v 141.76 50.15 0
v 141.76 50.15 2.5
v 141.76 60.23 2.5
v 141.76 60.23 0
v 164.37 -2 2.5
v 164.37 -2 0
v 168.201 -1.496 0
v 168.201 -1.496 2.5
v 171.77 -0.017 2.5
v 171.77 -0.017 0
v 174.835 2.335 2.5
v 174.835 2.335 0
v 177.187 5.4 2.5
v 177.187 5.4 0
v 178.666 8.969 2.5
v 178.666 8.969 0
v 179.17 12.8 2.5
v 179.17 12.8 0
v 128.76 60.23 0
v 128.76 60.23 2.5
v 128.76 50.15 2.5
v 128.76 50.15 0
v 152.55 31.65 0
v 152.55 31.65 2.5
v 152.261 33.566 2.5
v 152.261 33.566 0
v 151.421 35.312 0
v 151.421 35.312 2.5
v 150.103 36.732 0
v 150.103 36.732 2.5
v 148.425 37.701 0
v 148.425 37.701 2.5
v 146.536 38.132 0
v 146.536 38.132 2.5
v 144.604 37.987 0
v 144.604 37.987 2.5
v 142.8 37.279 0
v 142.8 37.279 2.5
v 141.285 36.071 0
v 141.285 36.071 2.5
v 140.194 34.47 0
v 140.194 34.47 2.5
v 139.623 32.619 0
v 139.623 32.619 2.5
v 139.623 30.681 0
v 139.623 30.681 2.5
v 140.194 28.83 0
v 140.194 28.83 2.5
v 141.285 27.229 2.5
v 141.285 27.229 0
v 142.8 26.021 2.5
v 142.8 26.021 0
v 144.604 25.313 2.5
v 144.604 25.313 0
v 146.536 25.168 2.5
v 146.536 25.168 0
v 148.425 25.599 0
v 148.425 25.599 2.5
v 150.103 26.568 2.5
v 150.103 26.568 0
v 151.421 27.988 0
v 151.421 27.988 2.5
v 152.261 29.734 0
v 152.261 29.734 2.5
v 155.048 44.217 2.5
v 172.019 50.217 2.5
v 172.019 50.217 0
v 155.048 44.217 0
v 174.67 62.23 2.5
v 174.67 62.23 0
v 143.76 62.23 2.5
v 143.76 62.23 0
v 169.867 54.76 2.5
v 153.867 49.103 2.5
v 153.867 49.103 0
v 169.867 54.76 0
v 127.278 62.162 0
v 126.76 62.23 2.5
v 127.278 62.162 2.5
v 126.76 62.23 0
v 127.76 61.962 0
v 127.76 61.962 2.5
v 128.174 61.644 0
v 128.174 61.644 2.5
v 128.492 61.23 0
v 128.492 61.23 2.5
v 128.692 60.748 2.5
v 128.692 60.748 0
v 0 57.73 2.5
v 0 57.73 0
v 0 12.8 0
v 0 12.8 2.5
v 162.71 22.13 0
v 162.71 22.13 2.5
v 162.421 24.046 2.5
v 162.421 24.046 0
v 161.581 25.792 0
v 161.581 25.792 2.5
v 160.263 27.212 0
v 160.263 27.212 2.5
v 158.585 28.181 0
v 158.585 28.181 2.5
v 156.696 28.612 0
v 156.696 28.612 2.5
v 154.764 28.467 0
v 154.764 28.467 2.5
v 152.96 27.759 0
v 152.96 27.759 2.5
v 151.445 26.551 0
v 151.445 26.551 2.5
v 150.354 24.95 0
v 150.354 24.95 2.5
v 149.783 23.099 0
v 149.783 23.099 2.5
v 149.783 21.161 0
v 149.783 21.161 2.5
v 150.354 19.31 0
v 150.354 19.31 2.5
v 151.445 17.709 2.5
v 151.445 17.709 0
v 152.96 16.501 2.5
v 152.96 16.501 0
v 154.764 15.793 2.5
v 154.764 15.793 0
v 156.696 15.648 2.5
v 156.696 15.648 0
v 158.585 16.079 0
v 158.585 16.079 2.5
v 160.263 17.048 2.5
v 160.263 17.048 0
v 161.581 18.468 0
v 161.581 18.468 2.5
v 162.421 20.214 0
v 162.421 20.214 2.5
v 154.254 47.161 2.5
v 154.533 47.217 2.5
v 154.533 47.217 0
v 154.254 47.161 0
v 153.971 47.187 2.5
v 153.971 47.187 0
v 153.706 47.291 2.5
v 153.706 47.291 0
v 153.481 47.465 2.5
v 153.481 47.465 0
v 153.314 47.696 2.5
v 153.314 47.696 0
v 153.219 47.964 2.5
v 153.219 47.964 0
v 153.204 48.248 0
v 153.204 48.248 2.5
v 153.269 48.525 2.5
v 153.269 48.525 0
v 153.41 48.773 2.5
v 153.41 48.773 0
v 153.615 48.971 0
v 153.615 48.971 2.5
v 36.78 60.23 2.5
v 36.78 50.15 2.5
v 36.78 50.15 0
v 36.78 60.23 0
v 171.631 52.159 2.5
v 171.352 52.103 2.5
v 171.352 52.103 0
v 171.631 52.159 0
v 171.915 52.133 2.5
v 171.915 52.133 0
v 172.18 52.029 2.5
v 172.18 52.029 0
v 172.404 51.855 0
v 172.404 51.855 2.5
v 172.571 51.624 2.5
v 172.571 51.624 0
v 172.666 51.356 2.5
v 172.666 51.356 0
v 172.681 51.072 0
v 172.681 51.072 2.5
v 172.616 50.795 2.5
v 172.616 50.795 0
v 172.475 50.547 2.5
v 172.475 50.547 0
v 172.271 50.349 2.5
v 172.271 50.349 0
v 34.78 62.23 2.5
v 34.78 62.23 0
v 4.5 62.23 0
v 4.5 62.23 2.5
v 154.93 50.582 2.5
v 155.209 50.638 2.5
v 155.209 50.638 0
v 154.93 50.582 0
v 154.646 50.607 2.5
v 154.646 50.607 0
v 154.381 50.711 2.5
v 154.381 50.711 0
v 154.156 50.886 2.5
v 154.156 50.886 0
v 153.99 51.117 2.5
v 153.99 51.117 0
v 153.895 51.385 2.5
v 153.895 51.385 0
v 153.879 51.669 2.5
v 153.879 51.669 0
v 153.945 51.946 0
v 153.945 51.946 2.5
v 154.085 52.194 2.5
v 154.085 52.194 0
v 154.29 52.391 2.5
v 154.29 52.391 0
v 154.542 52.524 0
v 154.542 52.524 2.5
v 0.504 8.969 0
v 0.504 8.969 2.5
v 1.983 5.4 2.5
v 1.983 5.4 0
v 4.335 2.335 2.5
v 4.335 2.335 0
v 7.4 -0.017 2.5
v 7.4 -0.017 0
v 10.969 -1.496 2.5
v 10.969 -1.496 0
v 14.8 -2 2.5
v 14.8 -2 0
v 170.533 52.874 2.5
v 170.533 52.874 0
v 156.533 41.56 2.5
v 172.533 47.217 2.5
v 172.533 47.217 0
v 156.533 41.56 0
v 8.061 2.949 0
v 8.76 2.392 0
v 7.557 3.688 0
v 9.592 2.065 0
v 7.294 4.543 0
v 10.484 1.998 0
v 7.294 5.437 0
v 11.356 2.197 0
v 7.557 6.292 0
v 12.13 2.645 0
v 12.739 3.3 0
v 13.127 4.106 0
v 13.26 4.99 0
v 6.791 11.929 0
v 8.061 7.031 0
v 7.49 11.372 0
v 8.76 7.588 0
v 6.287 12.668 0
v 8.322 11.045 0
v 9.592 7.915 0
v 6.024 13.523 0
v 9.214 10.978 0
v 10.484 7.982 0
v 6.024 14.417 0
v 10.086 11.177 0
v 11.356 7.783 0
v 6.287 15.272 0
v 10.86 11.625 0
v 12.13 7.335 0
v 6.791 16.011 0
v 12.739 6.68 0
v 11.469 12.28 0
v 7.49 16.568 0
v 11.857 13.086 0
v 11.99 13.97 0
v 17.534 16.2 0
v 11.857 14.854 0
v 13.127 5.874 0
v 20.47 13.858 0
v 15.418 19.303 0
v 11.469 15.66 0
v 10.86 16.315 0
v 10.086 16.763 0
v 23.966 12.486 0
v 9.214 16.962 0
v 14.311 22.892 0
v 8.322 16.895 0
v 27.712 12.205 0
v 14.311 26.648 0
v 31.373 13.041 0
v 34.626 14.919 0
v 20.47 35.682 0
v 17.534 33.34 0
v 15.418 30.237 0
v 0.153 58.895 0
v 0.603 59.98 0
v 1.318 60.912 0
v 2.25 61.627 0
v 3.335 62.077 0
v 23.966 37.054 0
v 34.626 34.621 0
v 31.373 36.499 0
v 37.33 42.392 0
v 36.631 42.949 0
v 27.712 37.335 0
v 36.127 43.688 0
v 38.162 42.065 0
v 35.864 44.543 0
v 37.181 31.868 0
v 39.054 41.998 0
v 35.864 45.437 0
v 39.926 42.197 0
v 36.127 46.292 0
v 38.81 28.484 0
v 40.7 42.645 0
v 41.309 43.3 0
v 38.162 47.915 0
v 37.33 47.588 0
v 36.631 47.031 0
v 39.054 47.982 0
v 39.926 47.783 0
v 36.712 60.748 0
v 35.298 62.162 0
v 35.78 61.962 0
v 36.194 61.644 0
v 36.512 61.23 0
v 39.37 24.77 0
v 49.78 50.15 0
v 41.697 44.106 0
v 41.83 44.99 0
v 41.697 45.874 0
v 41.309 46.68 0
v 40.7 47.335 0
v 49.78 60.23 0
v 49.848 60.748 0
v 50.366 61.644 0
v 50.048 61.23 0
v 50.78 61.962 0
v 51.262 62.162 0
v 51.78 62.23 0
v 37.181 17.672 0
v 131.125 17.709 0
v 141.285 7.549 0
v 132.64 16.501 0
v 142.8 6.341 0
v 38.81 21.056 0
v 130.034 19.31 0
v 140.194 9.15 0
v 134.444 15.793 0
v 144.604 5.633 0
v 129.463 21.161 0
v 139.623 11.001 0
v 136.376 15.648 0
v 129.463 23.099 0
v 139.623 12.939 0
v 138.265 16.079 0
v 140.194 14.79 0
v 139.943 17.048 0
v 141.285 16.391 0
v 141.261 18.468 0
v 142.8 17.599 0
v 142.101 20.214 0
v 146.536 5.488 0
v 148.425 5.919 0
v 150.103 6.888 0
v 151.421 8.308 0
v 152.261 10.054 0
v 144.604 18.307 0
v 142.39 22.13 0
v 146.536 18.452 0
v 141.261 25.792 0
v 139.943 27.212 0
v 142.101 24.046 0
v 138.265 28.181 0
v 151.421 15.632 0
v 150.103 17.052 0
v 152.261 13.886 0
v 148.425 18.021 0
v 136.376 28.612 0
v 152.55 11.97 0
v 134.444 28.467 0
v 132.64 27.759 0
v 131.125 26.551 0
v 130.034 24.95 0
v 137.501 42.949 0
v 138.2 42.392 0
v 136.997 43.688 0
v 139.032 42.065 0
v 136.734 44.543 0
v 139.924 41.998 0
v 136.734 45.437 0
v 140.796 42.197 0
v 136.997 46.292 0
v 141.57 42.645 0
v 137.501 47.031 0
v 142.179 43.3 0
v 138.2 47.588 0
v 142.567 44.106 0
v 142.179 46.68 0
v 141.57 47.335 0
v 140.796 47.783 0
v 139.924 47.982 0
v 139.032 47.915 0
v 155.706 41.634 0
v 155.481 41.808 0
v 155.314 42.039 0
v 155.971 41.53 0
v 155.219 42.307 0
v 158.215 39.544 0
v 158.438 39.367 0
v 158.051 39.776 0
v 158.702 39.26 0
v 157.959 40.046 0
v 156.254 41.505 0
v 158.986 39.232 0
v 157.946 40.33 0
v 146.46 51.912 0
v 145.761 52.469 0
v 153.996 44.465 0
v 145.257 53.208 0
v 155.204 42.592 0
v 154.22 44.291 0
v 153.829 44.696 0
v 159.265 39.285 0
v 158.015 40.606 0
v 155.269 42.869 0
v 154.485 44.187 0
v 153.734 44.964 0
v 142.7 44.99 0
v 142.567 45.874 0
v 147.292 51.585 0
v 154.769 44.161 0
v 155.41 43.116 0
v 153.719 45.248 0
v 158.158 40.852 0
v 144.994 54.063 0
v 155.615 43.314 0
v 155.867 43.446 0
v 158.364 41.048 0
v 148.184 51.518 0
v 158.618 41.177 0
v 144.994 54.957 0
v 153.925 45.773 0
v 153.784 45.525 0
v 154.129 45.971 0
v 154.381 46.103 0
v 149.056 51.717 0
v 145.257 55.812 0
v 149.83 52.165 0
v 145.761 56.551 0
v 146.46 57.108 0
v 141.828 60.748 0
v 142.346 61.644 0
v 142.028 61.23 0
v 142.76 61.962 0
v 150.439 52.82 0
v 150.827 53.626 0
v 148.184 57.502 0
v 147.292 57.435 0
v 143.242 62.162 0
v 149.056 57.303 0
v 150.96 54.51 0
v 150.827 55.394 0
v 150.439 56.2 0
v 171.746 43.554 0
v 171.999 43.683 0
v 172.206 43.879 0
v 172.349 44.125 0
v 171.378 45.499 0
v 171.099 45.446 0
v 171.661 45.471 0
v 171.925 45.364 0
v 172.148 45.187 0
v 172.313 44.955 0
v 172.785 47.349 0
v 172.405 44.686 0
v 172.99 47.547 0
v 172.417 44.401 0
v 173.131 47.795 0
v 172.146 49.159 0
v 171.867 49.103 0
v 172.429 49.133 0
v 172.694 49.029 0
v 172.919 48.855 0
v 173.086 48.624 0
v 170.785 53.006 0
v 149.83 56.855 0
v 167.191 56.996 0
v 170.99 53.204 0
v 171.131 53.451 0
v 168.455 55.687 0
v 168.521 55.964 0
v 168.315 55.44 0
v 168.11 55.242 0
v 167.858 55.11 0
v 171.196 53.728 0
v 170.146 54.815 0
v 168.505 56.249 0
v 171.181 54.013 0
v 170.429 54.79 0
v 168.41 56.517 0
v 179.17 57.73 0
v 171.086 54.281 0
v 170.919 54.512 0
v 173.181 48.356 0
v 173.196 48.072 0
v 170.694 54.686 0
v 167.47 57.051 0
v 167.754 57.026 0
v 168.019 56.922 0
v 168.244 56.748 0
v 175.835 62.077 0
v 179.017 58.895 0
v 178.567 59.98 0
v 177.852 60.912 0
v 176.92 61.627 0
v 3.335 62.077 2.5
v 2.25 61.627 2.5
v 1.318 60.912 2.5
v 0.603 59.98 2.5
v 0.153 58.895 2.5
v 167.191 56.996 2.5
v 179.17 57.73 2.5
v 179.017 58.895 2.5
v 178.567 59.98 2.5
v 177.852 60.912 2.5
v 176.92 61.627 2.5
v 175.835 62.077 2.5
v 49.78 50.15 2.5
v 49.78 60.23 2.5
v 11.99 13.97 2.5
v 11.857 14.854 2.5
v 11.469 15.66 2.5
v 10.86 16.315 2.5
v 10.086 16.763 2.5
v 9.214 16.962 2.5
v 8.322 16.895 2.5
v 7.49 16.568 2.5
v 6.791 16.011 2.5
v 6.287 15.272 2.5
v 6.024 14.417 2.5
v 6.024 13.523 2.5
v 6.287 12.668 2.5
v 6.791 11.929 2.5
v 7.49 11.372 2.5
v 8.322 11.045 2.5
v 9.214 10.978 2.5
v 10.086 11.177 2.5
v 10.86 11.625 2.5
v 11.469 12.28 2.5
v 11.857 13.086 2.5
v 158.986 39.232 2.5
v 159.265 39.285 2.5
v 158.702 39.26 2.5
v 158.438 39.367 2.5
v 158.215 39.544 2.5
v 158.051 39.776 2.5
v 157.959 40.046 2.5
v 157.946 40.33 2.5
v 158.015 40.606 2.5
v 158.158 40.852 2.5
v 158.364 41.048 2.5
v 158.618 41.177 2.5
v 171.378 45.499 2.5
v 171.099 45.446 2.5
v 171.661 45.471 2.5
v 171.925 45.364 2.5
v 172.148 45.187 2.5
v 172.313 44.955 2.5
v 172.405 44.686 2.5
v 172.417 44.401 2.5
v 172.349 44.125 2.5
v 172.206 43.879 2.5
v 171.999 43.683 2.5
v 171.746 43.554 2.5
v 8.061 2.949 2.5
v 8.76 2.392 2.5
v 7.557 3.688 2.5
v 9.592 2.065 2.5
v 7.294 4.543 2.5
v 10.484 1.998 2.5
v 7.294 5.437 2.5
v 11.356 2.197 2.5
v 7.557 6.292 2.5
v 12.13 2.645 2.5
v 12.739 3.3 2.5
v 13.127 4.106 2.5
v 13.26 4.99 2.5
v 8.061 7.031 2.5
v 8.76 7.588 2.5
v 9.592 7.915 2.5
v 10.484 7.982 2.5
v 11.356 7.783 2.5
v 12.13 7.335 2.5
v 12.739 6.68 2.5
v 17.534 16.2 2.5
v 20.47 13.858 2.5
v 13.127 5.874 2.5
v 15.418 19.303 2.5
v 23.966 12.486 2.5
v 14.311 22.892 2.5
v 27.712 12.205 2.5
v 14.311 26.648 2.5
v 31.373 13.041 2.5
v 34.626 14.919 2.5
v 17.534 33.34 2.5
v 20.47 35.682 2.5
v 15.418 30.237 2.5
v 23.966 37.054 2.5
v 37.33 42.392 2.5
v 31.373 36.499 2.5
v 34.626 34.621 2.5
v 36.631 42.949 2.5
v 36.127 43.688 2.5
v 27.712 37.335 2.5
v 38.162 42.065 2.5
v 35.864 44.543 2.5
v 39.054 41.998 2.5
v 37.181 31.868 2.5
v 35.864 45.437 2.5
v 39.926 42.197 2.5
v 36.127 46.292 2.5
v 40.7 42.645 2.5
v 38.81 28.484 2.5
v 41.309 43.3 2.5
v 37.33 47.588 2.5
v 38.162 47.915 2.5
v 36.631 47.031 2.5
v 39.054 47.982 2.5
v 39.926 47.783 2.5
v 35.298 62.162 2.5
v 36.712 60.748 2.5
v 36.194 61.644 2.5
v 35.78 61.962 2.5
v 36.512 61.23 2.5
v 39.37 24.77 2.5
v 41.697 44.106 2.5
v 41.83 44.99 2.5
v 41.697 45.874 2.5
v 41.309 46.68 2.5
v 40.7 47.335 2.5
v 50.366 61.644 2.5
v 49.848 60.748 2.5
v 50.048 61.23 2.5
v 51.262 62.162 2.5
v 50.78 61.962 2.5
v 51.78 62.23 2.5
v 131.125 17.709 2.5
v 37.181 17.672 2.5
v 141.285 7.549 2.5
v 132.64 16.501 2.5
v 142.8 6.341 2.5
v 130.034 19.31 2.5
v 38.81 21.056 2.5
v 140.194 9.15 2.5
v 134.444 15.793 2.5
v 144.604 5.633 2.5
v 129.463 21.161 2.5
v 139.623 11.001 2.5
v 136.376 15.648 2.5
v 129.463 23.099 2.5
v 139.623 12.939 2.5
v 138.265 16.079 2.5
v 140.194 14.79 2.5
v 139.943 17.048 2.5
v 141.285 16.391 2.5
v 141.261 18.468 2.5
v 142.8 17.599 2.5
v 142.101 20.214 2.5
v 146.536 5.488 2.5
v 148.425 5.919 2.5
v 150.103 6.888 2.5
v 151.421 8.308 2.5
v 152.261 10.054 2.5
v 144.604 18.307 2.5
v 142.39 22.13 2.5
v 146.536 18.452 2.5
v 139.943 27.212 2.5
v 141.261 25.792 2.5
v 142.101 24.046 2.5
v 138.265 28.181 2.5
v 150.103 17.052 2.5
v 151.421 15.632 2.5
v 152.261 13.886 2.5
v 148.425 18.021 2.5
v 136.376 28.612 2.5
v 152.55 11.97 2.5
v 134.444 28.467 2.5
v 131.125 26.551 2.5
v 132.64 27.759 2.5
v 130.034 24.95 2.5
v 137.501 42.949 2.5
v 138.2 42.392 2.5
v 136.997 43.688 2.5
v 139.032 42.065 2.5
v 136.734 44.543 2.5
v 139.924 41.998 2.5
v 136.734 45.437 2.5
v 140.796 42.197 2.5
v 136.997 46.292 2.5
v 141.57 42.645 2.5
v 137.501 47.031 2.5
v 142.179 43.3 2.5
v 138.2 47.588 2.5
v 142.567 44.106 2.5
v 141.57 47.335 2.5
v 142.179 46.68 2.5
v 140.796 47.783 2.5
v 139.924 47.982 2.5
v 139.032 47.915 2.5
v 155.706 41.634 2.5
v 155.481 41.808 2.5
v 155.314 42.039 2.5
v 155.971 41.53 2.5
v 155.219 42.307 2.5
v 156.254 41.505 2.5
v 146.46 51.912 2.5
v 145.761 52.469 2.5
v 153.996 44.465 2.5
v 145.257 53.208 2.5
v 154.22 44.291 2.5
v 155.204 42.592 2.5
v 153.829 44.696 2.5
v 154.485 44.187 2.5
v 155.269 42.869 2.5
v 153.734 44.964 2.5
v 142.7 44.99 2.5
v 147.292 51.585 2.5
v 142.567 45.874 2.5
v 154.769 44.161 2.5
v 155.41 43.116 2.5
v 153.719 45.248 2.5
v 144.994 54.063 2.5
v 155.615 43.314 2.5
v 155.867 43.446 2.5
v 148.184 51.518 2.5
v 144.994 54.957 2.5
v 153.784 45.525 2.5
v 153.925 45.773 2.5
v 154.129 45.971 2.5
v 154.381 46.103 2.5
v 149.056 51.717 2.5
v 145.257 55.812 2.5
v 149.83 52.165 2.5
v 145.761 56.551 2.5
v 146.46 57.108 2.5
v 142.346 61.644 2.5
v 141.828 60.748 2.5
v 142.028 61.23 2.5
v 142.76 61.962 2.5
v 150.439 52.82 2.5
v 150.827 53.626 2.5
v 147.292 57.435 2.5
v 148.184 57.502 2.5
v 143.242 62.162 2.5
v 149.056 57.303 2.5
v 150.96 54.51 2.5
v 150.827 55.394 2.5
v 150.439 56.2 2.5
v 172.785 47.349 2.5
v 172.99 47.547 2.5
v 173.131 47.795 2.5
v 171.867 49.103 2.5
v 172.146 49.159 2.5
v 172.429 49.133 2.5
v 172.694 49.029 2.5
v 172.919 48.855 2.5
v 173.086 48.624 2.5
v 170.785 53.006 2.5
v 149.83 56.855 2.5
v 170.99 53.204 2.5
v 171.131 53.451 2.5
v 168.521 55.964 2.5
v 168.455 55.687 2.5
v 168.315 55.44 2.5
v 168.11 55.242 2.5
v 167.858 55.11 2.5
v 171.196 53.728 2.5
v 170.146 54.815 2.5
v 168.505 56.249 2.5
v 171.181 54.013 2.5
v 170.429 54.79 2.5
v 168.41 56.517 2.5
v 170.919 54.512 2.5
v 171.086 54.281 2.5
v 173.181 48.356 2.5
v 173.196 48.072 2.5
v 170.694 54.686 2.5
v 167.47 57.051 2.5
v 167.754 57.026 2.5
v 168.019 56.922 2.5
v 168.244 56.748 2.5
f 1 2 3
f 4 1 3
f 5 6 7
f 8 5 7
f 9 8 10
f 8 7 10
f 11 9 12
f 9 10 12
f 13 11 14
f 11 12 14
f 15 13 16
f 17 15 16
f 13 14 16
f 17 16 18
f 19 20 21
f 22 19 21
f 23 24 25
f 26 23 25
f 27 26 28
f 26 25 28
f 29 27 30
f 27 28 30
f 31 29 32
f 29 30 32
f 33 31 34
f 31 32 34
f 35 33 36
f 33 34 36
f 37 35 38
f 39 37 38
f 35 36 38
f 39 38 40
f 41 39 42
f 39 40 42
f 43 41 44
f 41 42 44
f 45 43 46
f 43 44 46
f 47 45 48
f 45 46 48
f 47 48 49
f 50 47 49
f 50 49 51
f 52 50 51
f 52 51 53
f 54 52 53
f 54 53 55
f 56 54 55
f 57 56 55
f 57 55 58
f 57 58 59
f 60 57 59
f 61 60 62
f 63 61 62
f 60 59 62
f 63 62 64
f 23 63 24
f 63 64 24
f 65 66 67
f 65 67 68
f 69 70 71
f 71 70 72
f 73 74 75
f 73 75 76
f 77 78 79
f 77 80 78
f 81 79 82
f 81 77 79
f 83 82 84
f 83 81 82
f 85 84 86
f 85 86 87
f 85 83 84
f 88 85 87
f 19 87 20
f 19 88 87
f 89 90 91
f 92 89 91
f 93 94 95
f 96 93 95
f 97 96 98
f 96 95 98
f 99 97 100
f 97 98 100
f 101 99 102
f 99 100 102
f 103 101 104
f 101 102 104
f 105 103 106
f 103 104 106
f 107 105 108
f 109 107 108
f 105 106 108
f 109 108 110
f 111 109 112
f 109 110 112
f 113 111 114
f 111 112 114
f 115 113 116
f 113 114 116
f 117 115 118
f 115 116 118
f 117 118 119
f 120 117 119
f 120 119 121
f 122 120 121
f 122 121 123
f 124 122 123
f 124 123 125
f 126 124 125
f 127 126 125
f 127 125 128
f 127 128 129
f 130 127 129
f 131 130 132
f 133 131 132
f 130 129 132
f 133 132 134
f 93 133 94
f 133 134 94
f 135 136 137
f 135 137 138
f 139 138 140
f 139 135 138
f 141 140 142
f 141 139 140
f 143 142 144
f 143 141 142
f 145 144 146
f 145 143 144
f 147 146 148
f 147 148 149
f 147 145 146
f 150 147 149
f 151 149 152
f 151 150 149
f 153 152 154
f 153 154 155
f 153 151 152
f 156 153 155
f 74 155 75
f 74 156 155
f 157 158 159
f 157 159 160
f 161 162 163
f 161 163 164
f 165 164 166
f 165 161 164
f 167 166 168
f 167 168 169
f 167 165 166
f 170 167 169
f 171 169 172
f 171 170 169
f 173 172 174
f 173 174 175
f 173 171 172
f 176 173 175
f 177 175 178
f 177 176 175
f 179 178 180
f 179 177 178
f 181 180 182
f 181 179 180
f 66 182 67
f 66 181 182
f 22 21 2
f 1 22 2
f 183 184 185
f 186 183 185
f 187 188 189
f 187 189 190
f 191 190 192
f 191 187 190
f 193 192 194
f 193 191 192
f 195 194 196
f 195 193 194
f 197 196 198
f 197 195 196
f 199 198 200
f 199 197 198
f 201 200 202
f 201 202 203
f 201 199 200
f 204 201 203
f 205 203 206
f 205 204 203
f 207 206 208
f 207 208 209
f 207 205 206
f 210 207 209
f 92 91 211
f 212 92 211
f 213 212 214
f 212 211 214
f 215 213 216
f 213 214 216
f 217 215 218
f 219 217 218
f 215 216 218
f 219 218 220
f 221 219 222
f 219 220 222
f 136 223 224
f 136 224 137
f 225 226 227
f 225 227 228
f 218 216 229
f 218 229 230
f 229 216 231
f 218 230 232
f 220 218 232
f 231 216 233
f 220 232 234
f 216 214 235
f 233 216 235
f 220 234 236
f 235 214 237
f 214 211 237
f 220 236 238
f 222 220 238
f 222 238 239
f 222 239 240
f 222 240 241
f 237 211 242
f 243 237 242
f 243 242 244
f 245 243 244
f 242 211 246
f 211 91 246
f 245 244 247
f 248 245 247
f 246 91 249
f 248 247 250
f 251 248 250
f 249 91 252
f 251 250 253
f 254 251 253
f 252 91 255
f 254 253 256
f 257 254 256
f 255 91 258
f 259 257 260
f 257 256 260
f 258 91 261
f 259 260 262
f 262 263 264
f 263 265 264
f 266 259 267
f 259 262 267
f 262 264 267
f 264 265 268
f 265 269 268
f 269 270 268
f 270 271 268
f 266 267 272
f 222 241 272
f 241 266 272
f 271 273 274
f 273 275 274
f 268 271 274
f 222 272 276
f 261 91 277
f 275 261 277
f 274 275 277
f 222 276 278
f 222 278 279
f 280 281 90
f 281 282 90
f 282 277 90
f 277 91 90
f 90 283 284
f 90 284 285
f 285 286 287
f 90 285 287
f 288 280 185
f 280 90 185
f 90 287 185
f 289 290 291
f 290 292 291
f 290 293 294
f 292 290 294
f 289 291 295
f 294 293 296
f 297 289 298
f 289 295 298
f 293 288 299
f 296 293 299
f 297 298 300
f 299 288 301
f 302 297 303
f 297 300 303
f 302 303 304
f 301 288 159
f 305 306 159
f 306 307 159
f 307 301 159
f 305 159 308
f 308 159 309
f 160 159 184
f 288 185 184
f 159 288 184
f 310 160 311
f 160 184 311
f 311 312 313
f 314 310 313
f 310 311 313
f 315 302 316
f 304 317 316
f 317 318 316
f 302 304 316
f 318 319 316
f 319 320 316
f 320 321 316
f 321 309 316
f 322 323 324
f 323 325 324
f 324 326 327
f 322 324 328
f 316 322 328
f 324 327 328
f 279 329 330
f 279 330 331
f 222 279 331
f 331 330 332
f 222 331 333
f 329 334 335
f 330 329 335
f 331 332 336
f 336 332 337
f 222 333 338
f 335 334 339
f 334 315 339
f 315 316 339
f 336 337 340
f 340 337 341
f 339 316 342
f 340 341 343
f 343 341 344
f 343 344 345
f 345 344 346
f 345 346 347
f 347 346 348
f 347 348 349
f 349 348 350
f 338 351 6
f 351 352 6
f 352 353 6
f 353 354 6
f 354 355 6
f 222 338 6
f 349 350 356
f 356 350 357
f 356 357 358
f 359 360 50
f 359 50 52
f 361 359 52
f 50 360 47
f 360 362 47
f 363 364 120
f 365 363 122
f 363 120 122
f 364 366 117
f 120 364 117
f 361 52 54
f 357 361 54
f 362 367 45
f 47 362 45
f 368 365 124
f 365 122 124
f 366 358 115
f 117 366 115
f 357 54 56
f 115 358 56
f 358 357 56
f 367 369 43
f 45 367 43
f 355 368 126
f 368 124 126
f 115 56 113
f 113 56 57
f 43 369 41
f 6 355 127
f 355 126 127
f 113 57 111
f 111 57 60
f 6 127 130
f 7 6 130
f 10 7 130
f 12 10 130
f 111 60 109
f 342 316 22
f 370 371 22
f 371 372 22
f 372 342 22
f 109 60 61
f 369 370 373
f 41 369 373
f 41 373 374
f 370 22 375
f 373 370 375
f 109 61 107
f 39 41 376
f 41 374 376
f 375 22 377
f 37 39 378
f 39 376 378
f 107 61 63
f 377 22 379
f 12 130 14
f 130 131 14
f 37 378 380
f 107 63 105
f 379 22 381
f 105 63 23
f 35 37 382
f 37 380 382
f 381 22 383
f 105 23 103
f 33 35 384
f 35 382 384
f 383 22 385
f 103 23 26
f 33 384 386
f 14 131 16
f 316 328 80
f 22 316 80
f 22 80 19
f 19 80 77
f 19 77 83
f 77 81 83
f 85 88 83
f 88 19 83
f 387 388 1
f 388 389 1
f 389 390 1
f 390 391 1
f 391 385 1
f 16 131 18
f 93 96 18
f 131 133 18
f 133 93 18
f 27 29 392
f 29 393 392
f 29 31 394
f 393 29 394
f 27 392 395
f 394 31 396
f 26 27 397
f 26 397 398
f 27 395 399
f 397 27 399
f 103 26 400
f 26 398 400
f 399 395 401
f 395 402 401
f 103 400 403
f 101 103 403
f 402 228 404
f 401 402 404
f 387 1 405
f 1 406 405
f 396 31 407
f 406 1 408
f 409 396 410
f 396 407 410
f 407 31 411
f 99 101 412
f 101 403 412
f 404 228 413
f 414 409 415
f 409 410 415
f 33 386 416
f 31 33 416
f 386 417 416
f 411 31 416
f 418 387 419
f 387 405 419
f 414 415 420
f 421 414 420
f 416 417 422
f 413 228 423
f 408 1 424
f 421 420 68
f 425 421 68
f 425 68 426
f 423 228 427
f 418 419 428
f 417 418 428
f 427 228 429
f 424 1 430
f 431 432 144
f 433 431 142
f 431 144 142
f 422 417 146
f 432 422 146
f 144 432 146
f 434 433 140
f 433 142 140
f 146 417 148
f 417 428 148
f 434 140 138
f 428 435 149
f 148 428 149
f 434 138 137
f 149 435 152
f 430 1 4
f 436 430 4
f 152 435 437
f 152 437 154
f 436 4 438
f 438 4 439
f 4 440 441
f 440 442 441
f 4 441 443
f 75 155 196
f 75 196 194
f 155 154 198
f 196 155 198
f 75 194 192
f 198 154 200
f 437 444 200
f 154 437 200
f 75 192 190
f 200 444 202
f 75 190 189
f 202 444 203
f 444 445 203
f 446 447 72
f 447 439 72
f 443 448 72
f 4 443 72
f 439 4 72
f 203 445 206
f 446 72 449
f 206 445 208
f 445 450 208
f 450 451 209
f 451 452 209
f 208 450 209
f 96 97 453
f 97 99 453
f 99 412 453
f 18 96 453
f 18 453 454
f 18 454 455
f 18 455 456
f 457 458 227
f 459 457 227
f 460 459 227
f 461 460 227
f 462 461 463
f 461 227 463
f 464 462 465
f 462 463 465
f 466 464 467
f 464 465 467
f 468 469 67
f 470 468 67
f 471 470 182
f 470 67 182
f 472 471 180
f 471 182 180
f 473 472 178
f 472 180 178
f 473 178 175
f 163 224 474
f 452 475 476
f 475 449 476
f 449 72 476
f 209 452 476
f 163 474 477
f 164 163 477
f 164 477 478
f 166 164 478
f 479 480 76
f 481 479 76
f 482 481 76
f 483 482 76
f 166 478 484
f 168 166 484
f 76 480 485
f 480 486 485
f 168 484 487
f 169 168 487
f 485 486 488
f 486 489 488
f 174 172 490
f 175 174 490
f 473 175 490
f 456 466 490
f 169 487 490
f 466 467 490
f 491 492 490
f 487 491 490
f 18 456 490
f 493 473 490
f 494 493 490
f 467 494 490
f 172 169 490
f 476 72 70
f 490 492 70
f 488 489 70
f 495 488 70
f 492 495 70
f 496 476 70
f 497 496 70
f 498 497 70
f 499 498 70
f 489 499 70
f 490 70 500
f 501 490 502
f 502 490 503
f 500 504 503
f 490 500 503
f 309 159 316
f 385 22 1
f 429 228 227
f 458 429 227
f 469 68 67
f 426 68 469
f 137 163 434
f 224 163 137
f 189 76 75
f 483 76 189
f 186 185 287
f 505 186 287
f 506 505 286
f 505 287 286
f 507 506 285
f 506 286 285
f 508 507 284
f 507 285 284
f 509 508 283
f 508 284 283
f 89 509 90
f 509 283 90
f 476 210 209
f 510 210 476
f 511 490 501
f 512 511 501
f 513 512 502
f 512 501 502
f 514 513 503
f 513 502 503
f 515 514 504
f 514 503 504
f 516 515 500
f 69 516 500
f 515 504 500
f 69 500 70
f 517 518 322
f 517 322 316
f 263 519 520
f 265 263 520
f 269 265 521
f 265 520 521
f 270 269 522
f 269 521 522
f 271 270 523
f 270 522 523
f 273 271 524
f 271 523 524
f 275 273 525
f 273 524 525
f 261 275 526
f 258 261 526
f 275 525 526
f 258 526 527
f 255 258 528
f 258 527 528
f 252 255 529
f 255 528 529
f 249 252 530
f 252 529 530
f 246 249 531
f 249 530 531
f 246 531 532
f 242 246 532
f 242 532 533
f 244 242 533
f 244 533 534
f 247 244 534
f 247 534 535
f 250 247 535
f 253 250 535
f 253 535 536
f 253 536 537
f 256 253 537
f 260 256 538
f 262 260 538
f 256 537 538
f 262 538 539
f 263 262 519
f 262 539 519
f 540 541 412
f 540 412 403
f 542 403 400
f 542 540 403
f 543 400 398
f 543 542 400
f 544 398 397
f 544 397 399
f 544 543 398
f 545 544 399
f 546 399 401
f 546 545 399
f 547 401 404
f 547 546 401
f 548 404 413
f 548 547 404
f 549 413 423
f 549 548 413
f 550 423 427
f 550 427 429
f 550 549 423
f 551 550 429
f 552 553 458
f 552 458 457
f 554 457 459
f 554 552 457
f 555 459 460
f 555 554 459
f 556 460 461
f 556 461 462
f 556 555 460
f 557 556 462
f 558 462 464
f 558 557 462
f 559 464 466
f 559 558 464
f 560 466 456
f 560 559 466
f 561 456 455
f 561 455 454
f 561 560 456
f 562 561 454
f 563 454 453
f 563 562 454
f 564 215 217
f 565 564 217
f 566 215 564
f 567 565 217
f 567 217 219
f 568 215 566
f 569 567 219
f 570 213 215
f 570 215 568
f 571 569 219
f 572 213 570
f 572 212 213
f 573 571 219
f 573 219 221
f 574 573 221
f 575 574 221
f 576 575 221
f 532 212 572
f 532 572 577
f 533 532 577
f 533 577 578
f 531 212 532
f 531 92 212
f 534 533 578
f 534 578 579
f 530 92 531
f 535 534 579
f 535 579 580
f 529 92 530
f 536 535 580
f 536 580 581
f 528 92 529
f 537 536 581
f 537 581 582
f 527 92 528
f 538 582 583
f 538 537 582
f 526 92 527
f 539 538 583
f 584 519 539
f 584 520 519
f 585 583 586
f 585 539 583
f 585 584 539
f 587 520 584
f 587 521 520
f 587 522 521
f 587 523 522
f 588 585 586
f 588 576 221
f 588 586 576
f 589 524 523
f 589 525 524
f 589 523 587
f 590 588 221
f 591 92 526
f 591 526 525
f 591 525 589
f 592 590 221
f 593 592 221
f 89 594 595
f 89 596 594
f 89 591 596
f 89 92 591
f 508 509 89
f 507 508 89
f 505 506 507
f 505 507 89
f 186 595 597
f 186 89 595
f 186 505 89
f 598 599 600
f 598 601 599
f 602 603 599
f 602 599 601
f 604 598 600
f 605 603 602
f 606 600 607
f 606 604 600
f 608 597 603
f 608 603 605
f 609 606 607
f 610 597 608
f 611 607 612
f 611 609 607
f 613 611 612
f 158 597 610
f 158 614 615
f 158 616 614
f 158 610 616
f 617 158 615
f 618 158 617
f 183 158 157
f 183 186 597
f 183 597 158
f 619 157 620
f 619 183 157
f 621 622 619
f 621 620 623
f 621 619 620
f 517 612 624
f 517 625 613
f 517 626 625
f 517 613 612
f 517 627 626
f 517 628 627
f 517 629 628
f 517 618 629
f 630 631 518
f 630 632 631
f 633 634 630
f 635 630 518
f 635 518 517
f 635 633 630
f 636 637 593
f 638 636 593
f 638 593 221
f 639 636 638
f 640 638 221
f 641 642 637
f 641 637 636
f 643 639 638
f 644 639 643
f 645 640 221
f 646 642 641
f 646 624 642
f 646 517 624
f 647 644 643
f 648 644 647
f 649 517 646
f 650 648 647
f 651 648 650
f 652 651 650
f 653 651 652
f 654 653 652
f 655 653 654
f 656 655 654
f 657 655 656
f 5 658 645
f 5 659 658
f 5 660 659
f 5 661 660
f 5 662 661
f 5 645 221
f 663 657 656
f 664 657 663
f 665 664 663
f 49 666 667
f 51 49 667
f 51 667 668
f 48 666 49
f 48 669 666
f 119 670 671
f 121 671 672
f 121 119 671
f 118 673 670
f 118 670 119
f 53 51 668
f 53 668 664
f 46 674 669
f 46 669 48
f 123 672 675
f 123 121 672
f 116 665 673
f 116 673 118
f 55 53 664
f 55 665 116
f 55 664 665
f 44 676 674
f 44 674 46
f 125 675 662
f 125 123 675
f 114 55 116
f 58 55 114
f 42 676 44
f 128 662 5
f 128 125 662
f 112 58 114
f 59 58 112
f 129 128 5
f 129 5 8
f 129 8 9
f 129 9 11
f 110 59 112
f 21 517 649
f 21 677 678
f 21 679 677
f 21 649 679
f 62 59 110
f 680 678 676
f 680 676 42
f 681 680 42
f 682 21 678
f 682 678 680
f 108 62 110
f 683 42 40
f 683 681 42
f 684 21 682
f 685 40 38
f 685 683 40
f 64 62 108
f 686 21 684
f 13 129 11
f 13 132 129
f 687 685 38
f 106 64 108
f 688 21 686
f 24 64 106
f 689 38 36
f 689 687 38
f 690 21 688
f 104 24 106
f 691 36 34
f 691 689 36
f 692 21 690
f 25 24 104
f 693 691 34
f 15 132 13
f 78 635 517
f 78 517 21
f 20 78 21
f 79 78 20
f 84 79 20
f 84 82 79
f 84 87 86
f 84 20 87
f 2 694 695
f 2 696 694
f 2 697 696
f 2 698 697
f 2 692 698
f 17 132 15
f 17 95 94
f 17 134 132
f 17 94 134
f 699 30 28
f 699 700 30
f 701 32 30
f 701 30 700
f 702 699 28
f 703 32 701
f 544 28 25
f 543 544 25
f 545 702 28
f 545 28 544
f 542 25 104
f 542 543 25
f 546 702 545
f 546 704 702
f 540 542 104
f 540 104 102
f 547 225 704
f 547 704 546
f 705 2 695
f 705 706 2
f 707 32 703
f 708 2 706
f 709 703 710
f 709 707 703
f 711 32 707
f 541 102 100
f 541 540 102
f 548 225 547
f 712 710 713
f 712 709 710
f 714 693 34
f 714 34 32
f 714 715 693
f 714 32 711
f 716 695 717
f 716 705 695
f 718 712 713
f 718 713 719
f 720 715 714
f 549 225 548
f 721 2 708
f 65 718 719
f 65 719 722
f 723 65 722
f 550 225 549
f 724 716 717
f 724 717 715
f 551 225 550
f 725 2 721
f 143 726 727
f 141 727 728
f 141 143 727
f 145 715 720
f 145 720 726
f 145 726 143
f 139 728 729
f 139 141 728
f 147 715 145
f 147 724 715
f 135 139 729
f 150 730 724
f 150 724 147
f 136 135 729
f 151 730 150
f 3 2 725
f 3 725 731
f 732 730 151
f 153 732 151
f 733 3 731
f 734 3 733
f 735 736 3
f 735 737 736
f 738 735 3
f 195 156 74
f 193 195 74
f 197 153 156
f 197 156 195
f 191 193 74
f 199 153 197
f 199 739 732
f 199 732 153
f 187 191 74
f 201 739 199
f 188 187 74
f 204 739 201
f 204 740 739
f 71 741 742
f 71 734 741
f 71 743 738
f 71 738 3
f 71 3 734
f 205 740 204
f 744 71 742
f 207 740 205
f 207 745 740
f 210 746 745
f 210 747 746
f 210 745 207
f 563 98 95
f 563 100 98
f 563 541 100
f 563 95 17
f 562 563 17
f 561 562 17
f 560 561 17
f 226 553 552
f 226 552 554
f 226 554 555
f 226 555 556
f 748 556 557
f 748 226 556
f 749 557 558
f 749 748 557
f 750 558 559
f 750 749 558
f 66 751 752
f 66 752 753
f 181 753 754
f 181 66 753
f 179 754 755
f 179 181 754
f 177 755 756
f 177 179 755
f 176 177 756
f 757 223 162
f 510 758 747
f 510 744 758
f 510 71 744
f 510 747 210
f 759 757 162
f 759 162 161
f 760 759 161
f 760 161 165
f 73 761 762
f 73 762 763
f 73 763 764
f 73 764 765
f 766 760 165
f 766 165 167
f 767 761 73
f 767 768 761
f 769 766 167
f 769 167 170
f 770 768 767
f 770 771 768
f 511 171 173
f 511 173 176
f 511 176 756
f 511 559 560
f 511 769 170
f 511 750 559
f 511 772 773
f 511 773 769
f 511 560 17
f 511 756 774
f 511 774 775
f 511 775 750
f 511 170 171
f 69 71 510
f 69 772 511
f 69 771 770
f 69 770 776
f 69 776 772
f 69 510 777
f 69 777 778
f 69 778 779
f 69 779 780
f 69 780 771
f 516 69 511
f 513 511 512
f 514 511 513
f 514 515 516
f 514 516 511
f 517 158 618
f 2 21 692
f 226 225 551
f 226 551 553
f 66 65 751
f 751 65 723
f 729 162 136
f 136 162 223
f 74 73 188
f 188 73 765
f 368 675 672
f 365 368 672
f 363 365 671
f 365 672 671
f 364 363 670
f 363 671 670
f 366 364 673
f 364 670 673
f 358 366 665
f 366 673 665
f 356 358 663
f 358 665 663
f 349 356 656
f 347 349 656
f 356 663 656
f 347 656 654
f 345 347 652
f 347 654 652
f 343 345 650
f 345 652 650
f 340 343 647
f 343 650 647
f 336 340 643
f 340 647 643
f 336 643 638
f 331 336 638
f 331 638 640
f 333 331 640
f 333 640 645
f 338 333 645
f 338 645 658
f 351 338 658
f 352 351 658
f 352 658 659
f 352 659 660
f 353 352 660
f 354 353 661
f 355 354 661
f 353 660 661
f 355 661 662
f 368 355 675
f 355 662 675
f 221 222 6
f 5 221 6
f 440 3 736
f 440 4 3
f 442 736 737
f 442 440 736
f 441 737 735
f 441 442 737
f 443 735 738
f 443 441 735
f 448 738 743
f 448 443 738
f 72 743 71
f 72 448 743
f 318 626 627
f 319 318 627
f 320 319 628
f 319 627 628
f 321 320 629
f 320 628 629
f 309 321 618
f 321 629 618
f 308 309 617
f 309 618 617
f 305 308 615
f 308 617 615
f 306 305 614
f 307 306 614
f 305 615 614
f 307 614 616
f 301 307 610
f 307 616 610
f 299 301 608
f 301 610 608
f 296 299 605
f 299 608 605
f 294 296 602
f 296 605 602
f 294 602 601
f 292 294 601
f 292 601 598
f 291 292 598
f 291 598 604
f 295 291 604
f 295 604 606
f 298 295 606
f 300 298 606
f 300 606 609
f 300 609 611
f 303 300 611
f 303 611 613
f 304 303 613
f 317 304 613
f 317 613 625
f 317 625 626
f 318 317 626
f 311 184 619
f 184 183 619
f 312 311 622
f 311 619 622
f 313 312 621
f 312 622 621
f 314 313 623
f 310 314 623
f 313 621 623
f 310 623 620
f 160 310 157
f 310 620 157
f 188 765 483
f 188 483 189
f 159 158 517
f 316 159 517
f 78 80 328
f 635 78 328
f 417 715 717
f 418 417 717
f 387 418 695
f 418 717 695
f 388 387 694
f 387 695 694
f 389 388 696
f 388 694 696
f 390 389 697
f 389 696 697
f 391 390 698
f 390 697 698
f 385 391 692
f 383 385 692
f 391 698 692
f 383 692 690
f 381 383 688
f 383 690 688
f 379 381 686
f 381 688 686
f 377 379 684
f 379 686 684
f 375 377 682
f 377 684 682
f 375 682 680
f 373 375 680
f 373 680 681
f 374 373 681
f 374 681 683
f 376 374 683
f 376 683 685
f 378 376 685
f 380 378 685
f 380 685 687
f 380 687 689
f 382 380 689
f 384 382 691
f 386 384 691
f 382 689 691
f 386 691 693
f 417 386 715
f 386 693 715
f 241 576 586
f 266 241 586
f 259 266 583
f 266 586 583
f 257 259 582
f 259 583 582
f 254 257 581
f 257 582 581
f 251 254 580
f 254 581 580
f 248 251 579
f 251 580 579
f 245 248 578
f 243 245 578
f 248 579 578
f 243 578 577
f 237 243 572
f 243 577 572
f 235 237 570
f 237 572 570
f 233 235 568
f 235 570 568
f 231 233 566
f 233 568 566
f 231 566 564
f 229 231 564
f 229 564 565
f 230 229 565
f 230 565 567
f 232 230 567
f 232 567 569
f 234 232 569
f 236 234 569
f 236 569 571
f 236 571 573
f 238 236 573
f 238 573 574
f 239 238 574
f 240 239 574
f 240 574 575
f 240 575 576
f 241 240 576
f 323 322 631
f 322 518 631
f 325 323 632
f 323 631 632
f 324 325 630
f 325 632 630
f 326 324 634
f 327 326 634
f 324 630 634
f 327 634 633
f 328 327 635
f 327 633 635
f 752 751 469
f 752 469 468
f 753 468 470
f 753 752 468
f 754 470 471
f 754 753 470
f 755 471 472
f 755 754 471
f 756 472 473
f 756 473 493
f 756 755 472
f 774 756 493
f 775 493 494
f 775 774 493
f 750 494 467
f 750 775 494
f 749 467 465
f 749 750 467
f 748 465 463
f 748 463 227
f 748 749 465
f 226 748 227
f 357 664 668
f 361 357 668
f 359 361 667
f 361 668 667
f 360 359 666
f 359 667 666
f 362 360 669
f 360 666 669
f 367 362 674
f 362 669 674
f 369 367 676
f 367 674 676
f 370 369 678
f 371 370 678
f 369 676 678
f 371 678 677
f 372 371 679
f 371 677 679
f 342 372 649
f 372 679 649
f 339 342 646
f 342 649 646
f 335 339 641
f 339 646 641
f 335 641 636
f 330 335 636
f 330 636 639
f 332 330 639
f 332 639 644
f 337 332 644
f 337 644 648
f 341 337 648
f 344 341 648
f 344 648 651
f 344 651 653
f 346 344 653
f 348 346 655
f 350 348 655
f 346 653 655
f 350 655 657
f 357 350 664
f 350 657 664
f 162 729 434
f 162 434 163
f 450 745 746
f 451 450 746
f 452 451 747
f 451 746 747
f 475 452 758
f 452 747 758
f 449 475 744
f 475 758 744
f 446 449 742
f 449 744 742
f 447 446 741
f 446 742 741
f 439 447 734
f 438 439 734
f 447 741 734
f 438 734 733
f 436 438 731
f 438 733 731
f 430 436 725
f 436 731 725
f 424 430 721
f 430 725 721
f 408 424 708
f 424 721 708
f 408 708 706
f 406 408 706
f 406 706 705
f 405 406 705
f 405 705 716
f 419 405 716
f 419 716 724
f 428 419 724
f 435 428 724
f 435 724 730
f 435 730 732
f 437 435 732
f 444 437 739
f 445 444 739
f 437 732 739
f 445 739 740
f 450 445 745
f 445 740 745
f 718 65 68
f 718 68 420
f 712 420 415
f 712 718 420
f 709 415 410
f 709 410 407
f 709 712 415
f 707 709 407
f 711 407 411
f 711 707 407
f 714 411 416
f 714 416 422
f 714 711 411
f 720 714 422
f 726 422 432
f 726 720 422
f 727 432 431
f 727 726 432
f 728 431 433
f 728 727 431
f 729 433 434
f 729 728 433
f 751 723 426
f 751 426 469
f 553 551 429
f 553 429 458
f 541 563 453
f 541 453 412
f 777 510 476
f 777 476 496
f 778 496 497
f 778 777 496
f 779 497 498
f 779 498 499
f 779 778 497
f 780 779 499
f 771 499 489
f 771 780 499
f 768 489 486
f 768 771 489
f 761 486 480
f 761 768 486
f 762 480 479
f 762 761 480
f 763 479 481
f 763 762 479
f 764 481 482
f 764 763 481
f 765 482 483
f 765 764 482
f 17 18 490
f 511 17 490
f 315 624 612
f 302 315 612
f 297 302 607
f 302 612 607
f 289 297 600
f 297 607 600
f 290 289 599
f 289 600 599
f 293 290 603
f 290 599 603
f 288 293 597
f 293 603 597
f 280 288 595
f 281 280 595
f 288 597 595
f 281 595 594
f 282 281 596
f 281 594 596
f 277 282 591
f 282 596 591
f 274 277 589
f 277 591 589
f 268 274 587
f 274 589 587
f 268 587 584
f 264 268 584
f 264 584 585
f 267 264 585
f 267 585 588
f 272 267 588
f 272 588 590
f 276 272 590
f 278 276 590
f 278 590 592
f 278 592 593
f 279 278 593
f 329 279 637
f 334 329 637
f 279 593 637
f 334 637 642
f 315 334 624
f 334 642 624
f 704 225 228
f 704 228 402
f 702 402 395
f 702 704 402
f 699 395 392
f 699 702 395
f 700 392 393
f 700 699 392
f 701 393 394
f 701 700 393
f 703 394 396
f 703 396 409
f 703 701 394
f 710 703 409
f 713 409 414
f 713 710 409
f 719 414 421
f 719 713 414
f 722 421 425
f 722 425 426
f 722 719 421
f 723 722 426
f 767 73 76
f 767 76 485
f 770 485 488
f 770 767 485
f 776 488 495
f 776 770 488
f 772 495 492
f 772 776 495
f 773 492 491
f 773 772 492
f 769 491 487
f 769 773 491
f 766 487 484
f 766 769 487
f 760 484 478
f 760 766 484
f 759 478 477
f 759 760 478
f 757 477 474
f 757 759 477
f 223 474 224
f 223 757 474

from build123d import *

# Parameters (mm, degrees)
BOSS_EXTRU_1_DEPTH       = 2.5
ESQUISSE22_R             = 12.6
ENL_V_MAT_EXTRU_1_DEPTH  = 2.5
ESQUISSE23_R             = 3
ENL_V_MAT_EXTRU_2_DEPTH  = 2.5
ENL_V_MAT_EXTRU_3_DEPTH  = 2.5
ESQUISSE25_W             = 13
ESQUISSE25_H             = 3.371774097
ENL_V_MAT_EXTRU_4_DEPTH  = 2.5
CONG_1_R                 = 2
ESQUISSE26_R             = 6.5
ENL_V_MAT_EXTRU_5_DEPTH  = 2.5
ESQUISSE27_R             = 6.5
ENL_V_MAT_EXTRU_6_DEPTH  = 2.5
ESQUISSE30_W             = 13
ESQUISSE30_H             = 3.36
ENL_V_MAT_EXTRU_7_DEPTH  = 2.5
CONG_2_R                 = 2
ESQUISSE31_R             = 3
ENL_V_MAT_EXTRU_8_DEPTH  = 2.5
ENL_V_MAT_EXTRU_9_DEPTH  = 2.5
ESQUISSE33_R             = 3
ENL_V_MAT_EXTRU_10_DEPTH = 10
ESQUISSE34_R             = 3
ENL_V_MAT_EXTRU_11_DEPTH = 10


with BuildPart() as part:
    # Esquisse20 → Boss.-Extru.1 (new body)
    with BuildSketch(Plane.XY):
        with BuildLine():
            Line((14.8, -2), (164.37, -2))
            ThreePointArc((164.37, -2), (174.835180362, 2.334819638), (179.17, 12.8))
            Line((179.17, 12.8), (179.17, 57.73))
            ThreePointArc((179.17, 57.73), (177.851980515, 60.911980515), (174.67, 62.23))
            Line((174.67, 62.23), (4.5, 62.23))
            ThreePointArc((4.5, 62.23), (1.318019485, 60.911980515), (0, 57.73))
            Line((0, 57.73), (0, 12.8))
            ThreePointArc((0, 12.8), (4.334819638, 2.334819638), (14.8, -2))
        make_face()
    extrude(amount=BOSS_EXTRU_1_DEPTH)

    # Esquisse22 → Enlèv. mat.-Extru.1 (cut)
    with BuildSketch(Plane.XY.offset(2.5)):
        with Locations((26.77, 24.77)):
            Circle(ESQUISSE22_R)
    extrude(amount=-ENL_V_MAT_EXTRU_1_DEPTH, mode=Mode.SUBTRACT)

    # Esquisse23 → Enlèv. mat.-Extru.2 (cut)
    with BuildSketch(Plane.XY.offset(2.5)):
        with Locations((8.99, 13.97)):
            Circle(ESQUISSE23_R)
    extrude(amount=-ENL_V_MAT_EXTRU_2_DEPTH, mode=Mode.SUBTRACT)

    # Esquisse24 → Enlèv. mat.-Extru.3 (cut)
    with BuildSketch(Plane.XY.offset(2.5)):
        Polygon((36.78, 58.87), (36.78, 50.15), (49.78, 50.15), align=None)
        Polygon((49.78, 58.87), (49.78, 50.15), (36.78, 58.87), align=None)
    extrude(amount=-ENL_V_MAT_EXTRU_3_DEPTH, mode=Mode.SUBTRACT)

    # Esquisse25 → Enlèv. mat.-Extru.4 (cut)
    with BuildSketch(Plane.XY.offset(2.5)):
        with Locations((43.28, 60.555887049)):
            Rectangle(ESQUISSE25_W, ESQUISSE25_H)
    extrude(amount=-ENL_V_MAT_EXTRU_4_DEPTH, mode=Mode.SUBTRACT)

    # Congé1
    cong_1_edges = [part.edges().sort_by_distance(p)[0] for p in [
        (49.78, 62.23, 1.25),
        (36.78, 62.23, 1.25),
    ]]
    fillet(cong_1_edges, radius=CONG_1_R)

    # Esquisse26 → Enlèv. mat.-Extru.5 (cut)
    with BuildSketch(Plane.XY.offset(2.5)):
        with Locations((156.21, 22.13)):
            Circle(ESQUISSE26_R)
    extrude(amount=-ENL_V_MAT_EXTRU_5_DEPTH, mode=Mode.SUBTRACT)

    # Esquisse27 → Enlèv. mat.-Extru.6 (cut)
    with BuildSketch(Plane.XY.offset(2.5)):
        with Locations((146.05, 11.97)):
            Circle(ESQUISSE27_R)
        with Locations((135.89, 22.13)):
            Circle(ESQUISSE27_R)
        with Locations((146.05, 31.65)):
            Circle(ESQUISSE27_R)
    extrude(amount=-ENL_V_MAT_EXTRU_6_DEPTH, mode=Mode.SUBTRACT)

    # Esquisse30 → Enlèv. mat.-Extru.7 (cut)
    with BuildSketch(Plane.XY.offset(2.5)):
        with Locations((135.26, 60.55)):
            Rectangle(ESQUISSE30_W, ESQUISSE30_H)
        Polygon((141.76, 58.87), (128.76, 58.87), (135.26, 54.51), align=None)
        Polygon((135.26, 54.51), (128.76, 58.87), (128.76, 50.15), align=None)
        Polygon((141.76, 50.15), (135.26, 54.51), (128.76, 50.15), align=None)
        Polygon((141.76, 58.87), (135.26, 54.51), (141.76, 50.15), align=None)
    extrude(amount=-ENL_V_MAT_EXTRU_7_DEPTH, mode=Mode.SUBTRACT)

    # Congé2
    cong_2_edges = [part.edges().sort_by_distance(p)[0] for p in [
        (128.76, 62.23, 1.25),
        (141.76, 62.23, 1.25),
    ]]
    fillet(cong_2_edges, radius=CONG_2_R)

    # Esquisse31 → Enlèv. mat.-Extru.8 (cut)
    with BuildSketch(Plane.XY.offset(2.5)):
        with Locations((147.96, 54.51)):
            Circle(ESQUISSE31_R)
        with Locations((139.7, 44.99)):
            Circle(ESQUISSE31_R)
    extrude(amount=-ENL_V_MAT_EXTRU_8_DEPTH, mode=Mode.SUBTRACT)

    # Esquisse32 → Enlèv. mat.-Extru.9 (cut)
    with BuildSketch(Plane.XY.offset(2.5)):
        with BuildLine():
            Line((172.018614708, 50.217190958), (155.048051959, 44.217190958))
            ThreePointArc((155.048051959, 44.217190958), (153.771909584, 44.826666667), (154.381385292, 46.102809042))
            Line((154.381385292, 46.102809042), (171.351948041, 52.102809042))
            ThreePointArc((171.351948041, 52.102809042), (172.628090416, 51.493333333), (172.018614708, 50.217190958))
        make_face()
        with BuildLine():
            Line((153.866666667, 49.102809042), (169.866666667, 54.759663291))
            ThreePointArc((169.866666667, 54.759663291), (171.142809042, 54.150187583), (170.533333333, 52.874045208))
            Line((170.533333333, 52.874045208), (154.533333333, 47.217190958))
            ThreePointArc((154.533333333, 47.217190958), (153.257190958, 47.826666667), (153.866666667, 49.102809042))
        make_face()
        with BuildLine():
            Line((154.542111346, 52.523595314), (167.191221987, 56.995731269))
            ThreePointArc((167.191221987, 56.995731269), (168.467364362, 56.38625556), (167.857888654, 55.110113185))
            Line((167.857888654, 55.110113185), (155.208778013, 50.63797723))
            ThreePointArc((155.208778013, 50.63797723), (153.932635638, 51.247452939), (154.542111346, 52.523595314))
        make_face()
        with BuildLine():
            Line((155.866666667, 43.445954792), (171.866666667, 49.102809042))
            ThreePointArc((171.866666667, 49.102809042), (173.142809042, 48.493333333), (172.533333333, 47.217190958))
            Line((172.533333333, 47.217190958), (156.533333333, 41.560336709))
            ThreePointArc((156.533333333, 41.560336709), (155.257190958, 42.169812417), (155.866666667, 43.445954792))
        make_face()
        with BuildLine():
            Line((158.617948097, 41.177385778), (171.09857492, 45.446217537))
            ThreePointArc((171.09857492, 45.446217537), (172.368388344, 44.823663229), (171.745834035, 43.553849804))
            Line((171.745834035, 43.553849804), (159.265207213, 39.285018045))
            ThreePointArc((159.265207213, 39.285018045), (157.995393788, 39.907572354), (158.617948097, 41.177385778))
        make_face()
    extrude(amount=-ENL_V_MAT_EXTRU_9_DEPTH, mode=Mode.SUBTRACT)

    # Esquisse33 → Enlèv. mat.-Extru.10 (cut)
    with BuildSketch(Plane.XY.offset(2.5)):
        with Locations((38.83, 44.99)):
            Circle(ESQUISSE33_R)
    extrude(amount=-ENL_V_MAT_EXTRU_10_DEPTH, mode=Mode.SUBTRACT)

    # Esquisse34 → Enlèv. mat.-Extru.11 (cut)
    with BuildSketch(Plane.XY.offset(2.5)):
        with Locations((10.26, 4.99)):
            Circle(ESQUISSE34_R)
    extrude(amount=-ENL_V_MAT_EXTRU_11_DEPTH, mode=Mode.SUBTRACT)


solid = part.part
